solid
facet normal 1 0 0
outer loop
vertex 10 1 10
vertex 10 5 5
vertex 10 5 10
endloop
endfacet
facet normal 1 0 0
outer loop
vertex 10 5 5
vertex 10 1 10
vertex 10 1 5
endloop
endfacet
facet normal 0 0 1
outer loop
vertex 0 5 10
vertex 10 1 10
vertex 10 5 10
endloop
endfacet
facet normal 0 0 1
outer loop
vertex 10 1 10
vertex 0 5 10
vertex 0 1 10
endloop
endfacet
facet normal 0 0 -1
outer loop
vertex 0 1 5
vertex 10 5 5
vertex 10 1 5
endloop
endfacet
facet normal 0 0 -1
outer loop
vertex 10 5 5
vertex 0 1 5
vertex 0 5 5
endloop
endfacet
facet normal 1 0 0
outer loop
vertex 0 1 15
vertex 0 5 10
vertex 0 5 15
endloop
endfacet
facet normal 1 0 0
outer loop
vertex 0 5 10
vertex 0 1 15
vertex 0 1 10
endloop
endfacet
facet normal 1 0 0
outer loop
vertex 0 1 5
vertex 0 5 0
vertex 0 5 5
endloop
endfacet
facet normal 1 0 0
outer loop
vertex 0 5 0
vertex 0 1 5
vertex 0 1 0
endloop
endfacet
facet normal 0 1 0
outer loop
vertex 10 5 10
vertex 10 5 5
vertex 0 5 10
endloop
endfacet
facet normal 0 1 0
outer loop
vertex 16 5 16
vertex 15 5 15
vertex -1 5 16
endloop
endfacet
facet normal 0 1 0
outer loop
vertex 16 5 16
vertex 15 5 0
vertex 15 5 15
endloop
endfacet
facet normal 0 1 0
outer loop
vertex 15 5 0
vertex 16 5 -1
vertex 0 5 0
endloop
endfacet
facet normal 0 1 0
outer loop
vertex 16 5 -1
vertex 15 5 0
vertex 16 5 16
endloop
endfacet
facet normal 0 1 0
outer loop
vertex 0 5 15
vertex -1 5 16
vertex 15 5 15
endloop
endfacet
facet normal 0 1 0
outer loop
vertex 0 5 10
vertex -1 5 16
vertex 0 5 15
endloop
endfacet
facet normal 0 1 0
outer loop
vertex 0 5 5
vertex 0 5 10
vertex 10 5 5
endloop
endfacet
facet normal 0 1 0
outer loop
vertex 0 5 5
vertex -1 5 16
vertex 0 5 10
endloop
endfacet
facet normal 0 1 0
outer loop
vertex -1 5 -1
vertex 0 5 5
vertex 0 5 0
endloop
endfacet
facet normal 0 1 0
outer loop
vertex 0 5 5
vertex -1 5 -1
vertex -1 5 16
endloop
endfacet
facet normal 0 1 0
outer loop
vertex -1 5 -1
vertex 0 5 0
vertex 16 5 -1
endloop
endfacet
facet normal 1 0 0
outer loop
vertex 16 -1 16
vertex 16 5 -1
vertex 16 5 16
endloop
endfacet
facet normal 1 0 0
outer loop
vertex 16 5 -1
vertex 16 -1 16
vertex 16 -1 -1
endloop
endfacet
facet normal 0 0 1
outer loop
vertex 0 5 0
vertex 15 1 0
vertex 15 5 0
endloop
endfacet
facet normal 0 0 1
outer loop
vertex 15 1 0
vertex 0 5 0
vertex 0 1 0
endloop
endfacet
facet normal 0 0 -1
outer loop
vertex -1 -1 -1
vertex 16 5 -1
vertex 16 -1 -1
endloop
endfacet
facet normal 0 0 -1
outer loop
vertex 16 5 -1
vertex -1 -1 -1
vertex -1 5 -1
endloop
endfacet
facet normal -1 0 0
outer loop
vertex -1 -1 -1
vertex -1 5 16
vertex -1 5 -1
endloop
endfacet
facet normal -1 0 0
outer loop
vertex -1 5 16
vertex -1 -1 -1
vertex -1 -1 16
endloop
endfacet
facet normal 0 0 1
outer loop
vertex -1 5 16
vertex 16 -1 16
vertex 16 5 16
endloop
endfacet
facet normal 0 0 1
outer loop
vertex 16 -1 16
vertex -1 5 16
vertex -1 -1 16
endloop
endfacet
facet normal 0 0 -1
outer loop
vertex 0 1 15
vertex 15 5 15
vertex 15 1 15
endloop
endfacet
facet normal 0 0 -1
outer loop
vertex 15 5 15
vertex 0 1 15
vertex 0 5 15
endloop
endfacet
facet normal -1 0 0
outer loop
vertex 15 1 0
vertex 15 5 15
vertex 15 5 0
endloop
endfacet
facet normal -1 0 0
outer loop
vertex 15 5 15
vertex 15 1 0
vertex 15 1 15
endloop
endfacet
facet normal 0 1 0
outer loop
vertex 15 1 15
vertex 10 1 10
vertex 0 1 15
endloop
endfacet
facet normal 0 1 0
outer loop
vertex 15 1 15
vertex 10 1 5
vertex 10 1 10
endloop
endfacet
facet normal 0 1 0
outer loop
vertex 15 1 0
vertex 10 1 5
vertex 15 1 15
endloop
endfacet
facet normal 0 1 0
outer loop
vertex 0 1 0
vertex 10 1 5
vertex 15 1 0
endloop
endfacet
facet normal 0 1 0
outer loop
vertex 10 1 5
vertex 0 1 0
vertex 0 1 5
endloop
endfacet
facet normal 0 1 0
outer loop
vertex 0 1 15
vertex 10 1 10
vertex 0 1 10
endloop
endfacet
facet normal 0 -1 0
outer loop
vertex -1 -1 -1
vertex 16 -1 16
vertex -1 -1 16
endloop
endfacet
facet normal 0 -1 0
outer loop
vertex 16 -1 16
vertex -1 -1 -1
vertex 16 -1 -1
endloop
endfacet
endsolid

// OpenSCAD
// Display
    
translate([5, 2.5, -2.5+10])
    cube([10,5,5], center=true);
  
translate([7.5, 2.5, -0.5])
    cube([17,5,1], center=true);
    
translate([7.5, 2.5, -0.5+16])
    cube([17,5,1], center=true);
    
translate([0.5+15, 2.5, 7.5])
    cube([1,5,16], center=true);
    
translate([-0.5, 2.5, 7.5])
    cube([1,5,16], center=true);
    
translate([7.5, 0, 7.5])
    cube([17,2,17], center=true);
  

// SDF

//translate([5, 3, -1.5+9])
//    cube([10,6+10,3], center=true);
//  
//translate([7.5, 5, -0.5-5.5+1])
//    cube([15,10+10,1+11], center=true);
//    
//translate([7.5, 5, -0.5+5.5+15])
//    cube([15,10+10,1+11], center=true);
//    
//translate([0.5+5.5+14, 5, 7.5])
//    cube([1+11,10+10,14+10], center=true);
//    
//translate([0.5-5.5, 5, 7.5])
//    cube([1+11,10+10,14+10], center=true);
//    
//translate([7.5, 0-5, 7.5])
//    cube([15,2+10,15], center=true);
